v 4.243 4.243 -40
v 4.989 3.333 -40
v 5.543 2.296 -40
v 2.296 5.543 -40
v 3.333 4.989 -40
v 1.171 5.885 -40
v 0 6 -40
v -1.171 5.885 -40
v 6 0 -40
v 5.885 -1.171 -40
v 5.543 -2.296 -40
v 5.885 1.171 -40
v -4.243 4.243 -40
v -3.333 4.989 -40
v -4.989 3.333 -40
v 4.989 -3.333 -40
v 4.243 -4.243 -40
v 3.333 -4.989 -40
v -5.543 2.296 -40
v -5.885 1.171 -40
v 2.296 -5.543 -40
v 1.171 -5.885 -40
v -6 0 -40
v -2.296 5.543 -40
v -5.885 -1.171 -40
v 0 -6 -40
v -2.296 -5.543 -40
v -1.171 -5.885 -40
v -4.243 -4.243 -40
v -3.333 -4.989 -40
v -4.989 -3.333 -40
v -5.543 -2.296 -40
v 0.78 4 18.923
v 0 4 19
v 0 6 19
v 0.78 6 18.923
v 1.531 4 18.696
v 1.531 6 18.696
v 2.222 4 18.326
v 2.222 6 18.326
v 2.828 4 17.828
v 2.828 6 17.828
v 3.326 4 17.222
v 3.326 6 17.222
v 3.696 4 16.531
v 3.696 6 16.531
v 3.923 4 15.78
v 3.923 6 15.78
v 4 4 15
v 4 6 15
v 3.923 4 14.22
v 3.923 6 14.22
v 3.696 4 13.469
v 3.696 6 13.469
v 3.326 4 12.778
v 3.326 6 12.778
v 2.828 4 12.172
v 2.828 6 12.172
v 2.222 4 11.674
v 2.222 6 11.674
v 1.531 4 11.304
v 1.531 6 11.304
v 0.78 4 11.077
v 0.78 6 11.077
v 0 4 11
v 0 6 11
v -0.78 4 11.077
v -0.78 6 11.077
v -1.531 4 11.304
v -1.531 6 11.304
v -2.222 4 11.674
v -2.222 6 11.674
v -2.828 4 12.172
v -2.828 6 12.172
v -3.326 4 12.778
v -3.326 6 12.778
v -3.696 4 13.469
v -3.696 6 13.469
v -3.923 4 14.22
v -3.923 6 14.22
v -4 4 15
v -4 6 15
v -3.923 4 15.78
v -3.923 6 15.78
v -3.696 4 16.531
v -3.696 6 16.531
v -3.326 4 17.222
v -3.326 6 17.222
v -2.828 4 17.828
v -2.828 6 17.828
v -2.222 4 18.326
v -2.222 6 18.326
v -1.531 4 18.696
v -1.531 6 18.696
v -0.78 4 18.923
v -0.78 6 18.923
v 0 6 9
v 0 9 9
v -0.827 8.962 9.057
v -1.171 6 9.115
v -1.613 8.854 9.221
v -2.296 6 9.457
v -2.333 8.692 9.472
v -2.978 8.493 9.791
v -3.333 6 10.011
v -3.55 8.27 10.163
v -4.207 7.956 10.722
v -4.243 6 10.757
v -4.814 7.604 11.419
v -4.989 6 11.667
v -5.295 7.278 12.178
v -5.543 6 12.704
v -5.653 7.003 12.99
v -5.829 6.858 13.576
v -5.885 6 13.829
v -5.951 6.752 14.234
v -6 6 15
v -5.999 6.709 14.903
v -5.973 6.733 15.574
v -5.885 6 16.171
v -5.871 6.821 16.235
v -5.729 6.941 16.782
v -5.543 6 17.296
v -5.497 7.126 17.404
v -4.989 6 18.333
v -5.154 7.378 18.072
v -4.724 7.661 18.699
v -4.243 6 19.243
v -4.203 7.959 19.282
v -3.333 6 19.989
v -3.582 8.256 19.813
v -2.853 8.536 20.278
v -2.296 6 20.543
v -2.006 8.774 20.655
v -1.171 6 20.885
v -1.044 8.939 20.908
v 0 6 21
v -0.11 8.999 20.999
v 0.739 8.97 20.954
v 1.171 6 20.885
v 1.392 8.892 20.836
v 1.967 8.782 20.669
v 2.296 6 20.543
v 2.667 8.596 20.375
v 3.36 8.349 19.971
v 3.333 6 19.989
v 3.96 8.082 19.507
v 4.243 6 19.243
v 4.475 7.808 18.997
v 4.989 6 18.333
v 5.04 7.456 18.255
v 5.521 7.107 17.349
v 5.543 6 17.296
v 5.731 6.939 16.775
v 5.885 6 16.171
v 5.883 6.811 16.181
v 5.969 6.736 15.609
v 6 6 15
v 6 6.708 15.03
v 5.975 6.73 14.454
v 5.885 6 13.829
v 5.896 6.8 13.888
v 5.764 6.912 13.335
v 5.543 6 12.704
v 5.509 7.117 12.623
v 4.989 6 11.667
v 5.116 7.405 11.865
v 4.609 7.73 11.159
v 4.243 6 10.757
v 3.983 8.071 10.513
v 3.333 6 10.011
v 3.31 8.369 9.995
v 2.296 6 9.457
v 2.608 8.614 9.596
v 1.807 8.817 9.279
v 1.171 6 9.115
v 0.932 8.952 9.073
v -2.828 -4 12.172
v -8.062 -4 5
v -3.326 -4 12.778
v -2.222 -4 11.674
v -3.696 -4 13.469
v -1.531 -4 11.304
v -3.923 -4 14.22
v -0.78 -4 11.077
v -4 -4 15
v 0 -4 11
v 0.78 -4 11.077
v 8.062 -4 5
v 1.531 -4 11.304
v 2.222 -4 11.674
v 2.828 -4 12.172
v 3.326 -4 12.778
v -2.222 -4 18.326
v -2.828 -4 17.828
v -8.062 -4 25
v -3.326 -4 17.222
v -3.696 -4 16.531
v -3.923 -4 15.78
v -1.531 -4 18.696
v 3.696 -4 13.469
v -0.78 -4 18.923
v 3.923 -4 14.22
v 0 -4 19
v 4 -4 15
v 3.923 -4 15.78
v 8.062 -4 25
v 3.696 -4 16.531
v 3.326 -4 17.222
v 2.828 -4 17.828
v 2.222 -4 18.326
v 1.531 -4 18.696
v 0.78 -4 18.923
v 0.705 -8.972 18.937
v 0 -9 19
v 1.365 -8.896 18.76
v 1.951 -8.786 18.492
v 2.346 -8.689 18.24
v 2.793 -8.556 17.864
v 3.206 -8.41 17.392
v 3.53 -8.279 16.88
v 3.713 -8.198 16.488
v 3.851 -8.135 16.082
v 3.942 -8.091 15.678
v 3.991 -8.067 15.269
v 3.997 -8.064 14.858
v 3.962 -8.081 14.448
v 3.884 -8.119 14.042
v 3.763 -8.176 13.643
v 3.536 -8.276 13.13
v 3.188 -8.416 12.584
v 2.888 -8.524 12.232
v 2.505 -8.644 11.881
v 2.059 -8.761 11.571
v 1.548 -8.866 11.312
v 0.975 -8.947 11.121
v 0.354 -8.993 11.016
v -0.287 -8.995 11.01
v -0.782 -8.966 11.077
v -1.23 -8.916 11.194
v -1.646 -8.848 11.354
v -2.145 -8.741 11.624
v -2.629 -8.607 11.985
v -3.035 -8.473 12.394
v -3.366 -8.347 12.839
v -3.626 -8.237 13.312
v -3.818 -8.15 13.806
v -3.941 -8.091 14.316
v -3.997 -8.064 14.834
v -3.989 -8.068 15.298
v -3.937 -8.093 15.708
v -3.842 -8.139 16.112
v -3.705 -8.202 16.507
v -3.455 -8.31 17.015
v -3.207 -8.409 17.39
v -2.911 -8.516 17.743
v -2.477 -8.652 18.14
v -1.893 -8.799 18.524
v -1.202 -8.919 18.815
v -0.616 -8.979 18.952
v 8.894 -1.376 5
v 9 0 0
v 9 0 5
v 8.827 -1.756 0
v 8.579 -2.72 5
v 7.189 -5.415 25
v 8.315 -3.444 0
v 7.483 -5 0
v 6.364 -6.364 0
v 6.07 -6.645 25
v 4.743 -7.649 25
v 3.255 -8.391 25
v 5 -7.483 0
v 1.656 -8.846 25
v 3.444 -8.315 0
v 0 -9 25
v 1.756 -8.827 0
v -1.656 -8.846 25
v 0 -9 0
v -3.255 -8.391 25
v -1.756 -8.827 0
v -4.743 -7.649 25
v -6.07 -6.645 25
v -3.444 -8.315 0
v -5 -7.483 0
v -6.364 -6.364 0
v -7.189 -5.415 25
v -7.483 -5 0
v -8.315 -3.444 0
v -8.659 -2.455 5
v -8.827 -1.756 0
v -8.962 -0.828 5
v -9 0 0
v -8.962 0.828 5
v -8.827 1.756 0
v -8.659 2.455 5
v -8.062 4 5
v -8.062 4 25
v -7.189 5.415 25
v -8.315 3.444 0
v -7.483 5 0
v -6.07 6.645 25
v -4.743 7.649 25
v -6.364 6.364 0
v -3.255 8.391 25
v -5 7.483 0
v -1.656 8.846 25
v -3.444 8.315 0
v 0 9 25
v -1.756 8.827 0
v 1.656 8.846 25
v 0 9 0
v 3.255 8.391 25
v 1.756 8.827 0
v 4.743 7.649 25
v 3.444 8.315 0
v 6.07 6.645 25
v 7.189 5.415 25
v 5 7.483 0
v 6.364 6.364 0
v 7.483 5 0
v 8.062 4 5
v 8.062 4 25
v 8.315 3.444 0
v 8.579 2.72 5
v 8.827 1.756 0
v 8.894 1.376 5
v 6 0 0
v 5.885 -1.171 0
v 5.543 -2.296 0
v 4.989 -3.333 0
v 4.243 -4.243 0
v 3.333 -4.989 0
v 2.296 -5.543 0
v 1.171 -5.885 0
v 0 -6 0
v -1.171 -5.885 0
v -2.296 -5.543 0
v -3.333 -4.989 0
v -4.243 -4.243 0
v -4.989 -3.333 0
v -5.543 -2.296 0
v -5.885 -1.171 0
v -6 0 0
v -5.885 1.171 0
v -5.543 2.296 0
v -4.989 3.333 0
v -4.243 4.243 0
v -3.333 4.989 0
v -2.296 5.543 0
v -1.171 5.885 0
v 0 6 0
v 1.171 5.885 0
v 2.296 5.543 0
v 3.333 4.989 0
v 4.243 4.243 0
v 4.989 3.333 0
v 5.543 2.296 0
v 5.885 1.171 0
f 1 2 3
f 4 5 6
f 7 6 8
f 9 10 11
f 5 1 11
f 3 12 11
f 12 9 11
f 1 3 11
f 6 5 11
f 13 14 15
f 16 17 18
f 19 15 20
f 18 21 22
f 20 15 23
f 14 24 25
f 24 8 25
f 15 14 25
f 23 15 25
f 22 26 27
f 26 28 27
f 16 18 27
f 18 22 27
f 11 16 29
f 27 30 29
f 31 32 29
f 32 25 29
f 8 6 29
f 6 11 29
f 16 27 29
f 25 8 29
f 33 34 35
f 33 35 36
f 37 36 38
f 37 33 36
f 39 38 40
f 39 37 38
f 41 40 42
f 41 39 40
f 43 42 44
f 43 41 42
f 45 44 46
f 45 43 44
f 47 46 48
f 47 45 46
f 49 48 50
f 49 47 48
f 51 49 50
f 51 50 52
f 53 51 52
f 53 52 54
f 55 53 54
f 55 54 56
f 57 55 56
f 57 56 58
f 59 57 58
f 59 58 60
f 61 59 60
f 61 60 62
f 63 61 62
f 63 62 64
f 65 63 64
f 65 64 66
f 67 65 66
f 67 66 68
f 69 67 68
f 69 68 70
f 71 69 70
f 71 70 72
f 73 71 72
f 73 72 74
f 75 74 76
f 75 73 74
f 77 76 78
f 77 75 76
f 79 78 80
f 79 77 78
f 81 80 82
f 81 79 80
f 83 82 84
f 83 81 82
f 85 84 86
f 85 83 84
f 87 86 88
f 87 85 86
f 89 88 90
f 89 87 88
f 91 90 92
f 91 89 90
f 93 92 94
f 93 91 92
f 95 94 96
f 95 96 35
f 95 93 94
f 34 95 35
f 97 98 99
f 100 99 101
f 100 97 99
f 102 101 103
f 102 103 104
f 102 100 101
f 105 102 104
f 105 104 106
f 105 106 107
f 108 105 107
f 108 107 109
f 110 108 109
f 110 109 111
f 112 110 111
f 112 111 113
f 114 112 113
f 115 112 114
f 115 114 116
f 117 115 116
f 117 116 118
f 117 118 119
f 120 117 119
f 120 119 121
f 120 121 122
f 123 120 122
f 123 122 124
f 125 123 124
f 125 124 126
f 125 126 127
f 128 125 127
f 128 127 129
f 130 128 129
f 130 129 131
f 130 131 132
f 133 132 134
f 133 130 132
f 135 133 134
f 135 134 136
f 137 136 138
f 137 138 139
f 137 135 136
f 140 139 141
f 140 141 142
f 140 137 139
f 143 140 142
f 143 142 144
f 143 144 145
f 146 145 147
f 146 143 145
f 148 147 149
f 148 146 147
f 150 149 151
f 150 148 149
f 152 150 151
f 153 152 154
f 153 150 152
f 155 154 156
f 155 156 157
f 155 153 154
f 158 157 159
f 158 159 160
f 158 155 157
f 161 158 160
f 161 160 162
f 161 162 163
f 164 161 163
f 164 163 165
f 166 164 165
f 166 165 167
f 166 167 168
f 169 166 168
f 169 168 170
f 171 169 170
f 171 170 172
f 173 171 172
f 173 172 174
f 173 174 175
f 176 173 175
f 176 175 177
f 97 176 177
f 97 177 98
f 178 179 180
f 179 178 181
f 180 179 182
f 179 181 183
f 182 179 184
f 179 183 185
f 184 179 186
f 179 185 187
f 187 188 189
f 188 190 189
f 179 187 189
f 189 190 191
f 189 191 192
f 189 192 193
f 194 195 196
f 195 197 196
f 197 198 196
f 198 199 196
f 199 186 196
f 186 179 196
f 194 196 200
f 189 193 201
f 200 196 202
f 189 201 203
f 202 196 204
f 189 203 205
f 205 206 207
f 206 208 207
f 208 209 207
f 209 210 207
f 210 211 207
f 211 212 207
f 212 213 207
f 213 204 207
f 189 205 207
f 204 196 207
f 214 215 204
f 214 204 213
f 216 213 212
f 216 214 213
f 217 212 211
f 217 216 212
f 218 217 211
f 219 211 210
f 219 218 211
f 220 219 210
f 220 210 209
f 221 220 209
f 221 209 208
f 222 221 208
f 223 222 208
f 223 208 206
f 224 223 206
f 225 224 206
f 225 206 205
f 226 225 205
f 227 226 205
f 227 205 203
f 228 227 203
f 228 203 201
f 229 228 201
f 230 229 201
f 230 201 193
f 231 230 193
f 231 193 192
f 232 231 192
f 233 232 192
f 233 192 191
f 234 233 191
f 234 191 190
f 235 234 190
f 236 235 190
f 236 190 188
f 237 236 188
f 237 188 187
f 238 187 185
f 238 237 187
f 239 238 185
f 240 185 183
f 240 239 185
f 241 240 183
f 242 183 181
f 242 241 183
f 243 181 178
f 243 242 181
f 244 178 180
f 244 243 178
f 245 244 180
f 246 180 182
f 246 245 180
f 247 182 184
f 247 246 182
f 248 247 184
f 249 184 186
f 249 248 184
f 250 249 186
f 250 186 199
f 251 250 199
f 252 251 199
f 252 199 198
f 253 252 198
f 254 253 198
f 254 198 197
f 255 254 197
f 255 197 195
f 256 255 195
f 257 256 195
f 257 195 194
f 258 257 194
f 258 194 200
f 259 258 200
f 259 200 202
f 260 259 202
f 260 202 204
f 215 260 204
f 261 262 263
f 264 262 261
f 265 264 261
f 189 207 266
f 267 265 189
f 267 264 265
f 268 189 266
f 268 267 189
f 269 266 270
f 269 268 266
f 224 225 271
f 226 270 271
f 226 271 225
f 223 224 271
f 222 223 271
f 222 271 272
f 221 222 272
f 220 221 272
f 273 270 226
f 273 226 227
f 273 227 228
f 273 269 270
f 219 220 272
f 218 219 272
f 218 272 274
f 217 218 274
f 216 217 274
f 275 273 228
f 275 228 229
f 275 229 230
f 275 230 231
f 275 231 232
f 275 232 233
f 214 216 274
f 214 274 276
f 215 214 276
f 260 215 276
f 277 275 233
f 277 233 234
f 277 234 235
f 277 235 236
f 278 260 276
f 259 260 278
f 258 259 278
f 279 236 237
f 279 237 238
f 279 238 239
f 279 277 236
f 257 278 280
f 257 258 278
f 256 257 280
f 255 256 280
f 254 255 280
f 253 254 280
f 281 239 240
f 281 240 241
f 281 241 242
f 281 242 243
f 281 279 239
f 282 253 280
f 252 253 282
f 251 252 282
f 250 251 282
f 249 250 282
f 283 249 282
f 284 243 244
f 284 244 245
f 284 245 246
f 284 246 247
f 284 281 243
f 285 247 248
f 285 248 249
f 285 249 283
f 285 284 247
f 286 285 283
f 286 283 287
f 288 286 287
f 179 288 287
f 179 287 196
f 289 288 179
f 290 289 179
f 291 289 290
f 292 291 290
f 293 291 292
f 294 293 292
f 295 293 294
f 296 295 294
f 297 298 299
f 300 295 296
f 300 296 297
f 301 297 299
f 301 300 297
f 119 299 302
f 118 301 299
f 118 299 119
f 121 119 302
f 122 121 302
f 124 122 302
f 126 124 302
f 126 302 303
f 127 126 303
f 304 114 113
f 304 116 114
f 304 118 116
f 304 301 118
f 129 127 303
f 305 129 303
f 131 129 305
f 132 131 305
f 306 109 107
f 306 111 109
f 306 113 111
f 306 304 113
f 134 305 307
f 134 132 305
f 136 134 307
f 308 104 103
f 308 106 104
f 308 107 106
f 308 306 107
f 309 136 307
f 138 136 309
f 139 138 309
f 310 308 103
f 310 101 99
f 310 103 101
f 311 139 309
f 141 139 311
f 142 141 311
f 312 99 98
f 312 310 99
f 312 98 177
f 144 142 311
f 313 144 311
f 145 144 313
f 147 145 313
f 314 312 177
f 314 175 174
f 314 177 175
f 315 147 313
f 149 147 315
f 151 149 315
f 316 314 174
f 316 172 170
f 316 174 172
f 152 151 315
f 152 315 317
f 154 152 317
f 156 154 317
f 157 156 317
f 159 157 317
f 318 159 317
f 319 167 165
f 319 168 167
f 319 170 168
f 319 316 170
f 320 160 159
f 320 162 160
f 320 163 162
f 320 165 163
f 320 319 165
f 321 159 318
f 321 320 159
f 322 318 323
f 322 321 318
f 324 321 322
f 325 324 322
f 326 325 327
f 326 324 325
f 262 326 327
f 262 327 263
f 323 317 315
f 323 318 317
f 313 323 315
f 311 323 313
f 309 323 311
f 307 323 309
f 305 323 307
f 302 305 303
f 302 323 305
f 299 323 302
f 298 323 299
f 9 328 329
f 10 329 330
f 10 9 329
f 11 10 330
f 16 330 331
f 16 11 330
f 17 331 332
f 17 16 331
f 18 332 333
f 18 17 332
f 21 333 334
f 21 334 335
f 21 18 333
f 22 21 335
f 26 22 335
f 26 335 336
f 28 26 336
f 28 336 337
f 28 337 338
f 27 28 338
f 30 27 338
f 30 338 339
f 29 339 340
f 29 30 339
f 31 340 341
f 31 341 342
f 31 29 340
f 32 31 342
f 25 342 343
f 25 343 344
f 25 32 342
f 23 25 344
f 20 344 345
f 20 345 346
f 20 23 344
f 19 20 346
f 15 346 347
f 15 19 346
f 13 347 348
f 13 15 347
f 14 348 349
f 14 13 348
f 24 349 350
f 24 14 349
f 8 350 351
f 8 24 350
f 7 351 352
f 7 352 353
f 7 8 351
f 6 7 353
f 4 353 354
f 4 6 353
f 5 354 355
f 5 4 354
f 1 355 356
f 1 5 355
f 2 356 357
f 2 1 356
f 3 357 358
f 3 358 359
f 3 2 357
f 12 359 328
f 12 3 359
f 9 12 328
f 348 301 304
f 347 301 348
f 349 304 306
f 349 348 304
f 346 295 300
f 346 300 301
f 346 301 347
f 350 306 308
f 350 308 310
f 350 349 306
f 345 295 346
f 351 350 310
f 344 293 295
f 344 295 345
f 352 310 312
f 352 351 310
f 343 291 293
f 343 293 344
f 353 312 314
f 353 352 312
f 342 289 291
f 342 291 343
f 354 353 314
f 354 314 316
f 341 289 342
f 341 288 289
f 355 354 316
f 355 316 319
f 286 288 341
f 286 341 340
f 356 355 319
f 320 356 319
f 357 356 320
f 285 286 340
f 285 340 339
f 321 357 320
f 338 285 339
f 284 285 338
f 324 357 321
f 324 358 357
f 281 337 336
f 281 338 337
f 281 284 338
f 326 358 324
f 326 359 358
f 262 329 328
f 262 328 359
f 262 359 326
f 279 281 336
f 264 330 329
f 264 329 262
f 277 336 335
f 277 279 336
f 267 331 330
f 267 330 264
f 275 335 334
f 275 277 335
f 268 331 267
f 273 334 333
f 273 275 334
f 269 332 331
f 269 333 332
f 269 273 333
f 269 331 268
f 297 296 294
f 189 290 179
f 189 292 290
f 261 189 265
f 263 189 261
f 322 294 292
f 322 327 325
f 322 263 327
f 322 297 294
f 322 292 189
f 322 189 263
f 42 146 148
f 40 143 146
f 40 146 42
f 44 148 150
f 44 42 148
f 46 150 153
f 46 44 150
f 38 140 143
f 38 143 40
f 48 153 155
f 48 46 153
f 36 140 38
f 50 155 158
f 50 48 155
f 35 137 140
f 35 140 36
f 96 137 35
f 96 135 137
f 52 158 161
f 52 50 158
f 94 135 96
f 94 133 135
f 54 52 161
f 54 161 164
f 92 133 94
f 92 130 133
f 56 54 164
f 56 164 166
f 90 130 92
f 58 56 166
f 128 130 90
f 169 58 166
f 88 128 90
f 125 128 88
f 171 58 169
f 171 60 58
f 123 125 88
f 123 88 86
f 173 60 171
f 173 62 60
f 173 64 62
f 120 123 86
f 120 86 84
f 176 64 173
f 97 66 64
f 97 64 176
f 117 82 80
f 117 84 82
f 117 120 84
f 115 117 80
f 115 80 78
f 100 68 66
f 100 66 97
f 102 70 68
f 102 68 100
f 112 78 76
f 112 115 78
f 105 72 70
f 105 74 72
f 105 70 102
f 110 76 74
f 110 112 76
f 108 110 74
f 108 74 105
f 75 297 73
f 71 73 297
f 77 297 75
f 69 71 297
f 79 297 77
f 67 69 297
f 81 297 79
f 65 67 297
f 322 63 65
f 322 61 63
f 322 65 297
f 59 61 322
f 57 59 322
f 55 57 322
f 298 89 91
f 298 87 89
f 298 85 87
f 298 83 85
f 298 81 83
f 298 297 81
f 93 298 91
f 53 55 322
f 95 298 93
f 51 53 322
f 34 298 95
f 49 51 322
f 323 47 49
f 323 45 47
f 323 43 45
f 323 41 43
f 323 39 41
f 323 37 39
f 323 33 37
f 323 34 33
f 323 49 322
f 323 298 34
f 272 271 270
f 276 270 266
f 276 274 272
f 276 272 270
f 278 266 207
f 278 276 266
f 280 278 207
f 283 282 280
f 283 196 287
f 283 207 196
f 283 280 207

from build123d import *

# Parameters (mm, degrees)
SZKIC2_W                        = 18
SZKIC2_H                        = 8
WYTNIJ_WYCI_GNI_CIE1_DEPTH      = 20
WYTNIJ_WYCI_GNI_CIE2_DEPTH      = 42.976183724
WYTNIJ_WYCI_GNI_CIE2_DEPTH_BACK = 42.976183724
SZKIC3_R                        = 4
WYTNIJ_WYCI_GNI_CIE3_START      = 6
SZKIC3_4_R                      = 6
SZKIC3_4_R_2                    = 4
WYTNIJ_WYCI_GNI_CIE3_DEPTH      = 36.976183767


with BuildPart() as part:
    # Szkic1 → Obrót1 (revolve)
    with BuildSketch(Plane(origin=(0, 0, 0), x_dir=(1, 0, 0), z_dir=(0, 1, 0))):
        Polygon((0, -25), (9, -25), (9, 0), (6, 0), (6, 40), (0, 40), align=None)
    revolve(axis=Axis((0, 0, 44.409951059), (0, 0, -1)))

    # Szkic2 → Wytnij-wyciągnięcie1 (cut)
    with BuildSketch(Plane.XY.offset(25)):
        Rectangle(SZKIC2_W, SZKIC2_H)
    extrude(amount=-WYTNIJ_WYCI_GNI_CIE1_DEPTH, mode=Mode.SUBTRACT)

    # Szkic3 → Wytnij-wyciągnięcie2 (cut, two sides: drawn at the far end of the back side and taken through both)
    with BuildSketch(Plane(origin=(0, 0, 0), x_dir=(1, 0, 0), z_dir=(0, 1, 0)).offset(-WYTNIJ_WYCI_GNI_CIE2_DEPTH_BACK)):
        with Locations((0, -15)):
            Circle(SZKIC3_R)
    extrude(amount=WYTNIJ_WYCI_GNI_CIE2_DEPTH + WYTNIJ_WYCI_GNI_CIE2_DEPTH_BACK, mode=Mode.SUBTRACT)

    # Szkic3<4> → Wytnij-wyciągnięcie3 (cut, through all)
    with BuildSketch(Plane(origin=(0, 0, 0), x_dir=(1, 0, 0), z_dir=(0, 1, 0)).offset(WYTNIJ_WYCI_GNI_CIE3_START)):
        with Locations((0, -15)):
            Circle(SZKIC3_4_R)
        with Locations((0, -15)):
            Circle(SZKIC3_4_R_2, mode=Mode.SUBTRACT)
    extrude(amount=WYTNIJ_WYCI_GNI_CIE3_DEPTH, mode=Mode.SUBTRACT)


solid = part.part
